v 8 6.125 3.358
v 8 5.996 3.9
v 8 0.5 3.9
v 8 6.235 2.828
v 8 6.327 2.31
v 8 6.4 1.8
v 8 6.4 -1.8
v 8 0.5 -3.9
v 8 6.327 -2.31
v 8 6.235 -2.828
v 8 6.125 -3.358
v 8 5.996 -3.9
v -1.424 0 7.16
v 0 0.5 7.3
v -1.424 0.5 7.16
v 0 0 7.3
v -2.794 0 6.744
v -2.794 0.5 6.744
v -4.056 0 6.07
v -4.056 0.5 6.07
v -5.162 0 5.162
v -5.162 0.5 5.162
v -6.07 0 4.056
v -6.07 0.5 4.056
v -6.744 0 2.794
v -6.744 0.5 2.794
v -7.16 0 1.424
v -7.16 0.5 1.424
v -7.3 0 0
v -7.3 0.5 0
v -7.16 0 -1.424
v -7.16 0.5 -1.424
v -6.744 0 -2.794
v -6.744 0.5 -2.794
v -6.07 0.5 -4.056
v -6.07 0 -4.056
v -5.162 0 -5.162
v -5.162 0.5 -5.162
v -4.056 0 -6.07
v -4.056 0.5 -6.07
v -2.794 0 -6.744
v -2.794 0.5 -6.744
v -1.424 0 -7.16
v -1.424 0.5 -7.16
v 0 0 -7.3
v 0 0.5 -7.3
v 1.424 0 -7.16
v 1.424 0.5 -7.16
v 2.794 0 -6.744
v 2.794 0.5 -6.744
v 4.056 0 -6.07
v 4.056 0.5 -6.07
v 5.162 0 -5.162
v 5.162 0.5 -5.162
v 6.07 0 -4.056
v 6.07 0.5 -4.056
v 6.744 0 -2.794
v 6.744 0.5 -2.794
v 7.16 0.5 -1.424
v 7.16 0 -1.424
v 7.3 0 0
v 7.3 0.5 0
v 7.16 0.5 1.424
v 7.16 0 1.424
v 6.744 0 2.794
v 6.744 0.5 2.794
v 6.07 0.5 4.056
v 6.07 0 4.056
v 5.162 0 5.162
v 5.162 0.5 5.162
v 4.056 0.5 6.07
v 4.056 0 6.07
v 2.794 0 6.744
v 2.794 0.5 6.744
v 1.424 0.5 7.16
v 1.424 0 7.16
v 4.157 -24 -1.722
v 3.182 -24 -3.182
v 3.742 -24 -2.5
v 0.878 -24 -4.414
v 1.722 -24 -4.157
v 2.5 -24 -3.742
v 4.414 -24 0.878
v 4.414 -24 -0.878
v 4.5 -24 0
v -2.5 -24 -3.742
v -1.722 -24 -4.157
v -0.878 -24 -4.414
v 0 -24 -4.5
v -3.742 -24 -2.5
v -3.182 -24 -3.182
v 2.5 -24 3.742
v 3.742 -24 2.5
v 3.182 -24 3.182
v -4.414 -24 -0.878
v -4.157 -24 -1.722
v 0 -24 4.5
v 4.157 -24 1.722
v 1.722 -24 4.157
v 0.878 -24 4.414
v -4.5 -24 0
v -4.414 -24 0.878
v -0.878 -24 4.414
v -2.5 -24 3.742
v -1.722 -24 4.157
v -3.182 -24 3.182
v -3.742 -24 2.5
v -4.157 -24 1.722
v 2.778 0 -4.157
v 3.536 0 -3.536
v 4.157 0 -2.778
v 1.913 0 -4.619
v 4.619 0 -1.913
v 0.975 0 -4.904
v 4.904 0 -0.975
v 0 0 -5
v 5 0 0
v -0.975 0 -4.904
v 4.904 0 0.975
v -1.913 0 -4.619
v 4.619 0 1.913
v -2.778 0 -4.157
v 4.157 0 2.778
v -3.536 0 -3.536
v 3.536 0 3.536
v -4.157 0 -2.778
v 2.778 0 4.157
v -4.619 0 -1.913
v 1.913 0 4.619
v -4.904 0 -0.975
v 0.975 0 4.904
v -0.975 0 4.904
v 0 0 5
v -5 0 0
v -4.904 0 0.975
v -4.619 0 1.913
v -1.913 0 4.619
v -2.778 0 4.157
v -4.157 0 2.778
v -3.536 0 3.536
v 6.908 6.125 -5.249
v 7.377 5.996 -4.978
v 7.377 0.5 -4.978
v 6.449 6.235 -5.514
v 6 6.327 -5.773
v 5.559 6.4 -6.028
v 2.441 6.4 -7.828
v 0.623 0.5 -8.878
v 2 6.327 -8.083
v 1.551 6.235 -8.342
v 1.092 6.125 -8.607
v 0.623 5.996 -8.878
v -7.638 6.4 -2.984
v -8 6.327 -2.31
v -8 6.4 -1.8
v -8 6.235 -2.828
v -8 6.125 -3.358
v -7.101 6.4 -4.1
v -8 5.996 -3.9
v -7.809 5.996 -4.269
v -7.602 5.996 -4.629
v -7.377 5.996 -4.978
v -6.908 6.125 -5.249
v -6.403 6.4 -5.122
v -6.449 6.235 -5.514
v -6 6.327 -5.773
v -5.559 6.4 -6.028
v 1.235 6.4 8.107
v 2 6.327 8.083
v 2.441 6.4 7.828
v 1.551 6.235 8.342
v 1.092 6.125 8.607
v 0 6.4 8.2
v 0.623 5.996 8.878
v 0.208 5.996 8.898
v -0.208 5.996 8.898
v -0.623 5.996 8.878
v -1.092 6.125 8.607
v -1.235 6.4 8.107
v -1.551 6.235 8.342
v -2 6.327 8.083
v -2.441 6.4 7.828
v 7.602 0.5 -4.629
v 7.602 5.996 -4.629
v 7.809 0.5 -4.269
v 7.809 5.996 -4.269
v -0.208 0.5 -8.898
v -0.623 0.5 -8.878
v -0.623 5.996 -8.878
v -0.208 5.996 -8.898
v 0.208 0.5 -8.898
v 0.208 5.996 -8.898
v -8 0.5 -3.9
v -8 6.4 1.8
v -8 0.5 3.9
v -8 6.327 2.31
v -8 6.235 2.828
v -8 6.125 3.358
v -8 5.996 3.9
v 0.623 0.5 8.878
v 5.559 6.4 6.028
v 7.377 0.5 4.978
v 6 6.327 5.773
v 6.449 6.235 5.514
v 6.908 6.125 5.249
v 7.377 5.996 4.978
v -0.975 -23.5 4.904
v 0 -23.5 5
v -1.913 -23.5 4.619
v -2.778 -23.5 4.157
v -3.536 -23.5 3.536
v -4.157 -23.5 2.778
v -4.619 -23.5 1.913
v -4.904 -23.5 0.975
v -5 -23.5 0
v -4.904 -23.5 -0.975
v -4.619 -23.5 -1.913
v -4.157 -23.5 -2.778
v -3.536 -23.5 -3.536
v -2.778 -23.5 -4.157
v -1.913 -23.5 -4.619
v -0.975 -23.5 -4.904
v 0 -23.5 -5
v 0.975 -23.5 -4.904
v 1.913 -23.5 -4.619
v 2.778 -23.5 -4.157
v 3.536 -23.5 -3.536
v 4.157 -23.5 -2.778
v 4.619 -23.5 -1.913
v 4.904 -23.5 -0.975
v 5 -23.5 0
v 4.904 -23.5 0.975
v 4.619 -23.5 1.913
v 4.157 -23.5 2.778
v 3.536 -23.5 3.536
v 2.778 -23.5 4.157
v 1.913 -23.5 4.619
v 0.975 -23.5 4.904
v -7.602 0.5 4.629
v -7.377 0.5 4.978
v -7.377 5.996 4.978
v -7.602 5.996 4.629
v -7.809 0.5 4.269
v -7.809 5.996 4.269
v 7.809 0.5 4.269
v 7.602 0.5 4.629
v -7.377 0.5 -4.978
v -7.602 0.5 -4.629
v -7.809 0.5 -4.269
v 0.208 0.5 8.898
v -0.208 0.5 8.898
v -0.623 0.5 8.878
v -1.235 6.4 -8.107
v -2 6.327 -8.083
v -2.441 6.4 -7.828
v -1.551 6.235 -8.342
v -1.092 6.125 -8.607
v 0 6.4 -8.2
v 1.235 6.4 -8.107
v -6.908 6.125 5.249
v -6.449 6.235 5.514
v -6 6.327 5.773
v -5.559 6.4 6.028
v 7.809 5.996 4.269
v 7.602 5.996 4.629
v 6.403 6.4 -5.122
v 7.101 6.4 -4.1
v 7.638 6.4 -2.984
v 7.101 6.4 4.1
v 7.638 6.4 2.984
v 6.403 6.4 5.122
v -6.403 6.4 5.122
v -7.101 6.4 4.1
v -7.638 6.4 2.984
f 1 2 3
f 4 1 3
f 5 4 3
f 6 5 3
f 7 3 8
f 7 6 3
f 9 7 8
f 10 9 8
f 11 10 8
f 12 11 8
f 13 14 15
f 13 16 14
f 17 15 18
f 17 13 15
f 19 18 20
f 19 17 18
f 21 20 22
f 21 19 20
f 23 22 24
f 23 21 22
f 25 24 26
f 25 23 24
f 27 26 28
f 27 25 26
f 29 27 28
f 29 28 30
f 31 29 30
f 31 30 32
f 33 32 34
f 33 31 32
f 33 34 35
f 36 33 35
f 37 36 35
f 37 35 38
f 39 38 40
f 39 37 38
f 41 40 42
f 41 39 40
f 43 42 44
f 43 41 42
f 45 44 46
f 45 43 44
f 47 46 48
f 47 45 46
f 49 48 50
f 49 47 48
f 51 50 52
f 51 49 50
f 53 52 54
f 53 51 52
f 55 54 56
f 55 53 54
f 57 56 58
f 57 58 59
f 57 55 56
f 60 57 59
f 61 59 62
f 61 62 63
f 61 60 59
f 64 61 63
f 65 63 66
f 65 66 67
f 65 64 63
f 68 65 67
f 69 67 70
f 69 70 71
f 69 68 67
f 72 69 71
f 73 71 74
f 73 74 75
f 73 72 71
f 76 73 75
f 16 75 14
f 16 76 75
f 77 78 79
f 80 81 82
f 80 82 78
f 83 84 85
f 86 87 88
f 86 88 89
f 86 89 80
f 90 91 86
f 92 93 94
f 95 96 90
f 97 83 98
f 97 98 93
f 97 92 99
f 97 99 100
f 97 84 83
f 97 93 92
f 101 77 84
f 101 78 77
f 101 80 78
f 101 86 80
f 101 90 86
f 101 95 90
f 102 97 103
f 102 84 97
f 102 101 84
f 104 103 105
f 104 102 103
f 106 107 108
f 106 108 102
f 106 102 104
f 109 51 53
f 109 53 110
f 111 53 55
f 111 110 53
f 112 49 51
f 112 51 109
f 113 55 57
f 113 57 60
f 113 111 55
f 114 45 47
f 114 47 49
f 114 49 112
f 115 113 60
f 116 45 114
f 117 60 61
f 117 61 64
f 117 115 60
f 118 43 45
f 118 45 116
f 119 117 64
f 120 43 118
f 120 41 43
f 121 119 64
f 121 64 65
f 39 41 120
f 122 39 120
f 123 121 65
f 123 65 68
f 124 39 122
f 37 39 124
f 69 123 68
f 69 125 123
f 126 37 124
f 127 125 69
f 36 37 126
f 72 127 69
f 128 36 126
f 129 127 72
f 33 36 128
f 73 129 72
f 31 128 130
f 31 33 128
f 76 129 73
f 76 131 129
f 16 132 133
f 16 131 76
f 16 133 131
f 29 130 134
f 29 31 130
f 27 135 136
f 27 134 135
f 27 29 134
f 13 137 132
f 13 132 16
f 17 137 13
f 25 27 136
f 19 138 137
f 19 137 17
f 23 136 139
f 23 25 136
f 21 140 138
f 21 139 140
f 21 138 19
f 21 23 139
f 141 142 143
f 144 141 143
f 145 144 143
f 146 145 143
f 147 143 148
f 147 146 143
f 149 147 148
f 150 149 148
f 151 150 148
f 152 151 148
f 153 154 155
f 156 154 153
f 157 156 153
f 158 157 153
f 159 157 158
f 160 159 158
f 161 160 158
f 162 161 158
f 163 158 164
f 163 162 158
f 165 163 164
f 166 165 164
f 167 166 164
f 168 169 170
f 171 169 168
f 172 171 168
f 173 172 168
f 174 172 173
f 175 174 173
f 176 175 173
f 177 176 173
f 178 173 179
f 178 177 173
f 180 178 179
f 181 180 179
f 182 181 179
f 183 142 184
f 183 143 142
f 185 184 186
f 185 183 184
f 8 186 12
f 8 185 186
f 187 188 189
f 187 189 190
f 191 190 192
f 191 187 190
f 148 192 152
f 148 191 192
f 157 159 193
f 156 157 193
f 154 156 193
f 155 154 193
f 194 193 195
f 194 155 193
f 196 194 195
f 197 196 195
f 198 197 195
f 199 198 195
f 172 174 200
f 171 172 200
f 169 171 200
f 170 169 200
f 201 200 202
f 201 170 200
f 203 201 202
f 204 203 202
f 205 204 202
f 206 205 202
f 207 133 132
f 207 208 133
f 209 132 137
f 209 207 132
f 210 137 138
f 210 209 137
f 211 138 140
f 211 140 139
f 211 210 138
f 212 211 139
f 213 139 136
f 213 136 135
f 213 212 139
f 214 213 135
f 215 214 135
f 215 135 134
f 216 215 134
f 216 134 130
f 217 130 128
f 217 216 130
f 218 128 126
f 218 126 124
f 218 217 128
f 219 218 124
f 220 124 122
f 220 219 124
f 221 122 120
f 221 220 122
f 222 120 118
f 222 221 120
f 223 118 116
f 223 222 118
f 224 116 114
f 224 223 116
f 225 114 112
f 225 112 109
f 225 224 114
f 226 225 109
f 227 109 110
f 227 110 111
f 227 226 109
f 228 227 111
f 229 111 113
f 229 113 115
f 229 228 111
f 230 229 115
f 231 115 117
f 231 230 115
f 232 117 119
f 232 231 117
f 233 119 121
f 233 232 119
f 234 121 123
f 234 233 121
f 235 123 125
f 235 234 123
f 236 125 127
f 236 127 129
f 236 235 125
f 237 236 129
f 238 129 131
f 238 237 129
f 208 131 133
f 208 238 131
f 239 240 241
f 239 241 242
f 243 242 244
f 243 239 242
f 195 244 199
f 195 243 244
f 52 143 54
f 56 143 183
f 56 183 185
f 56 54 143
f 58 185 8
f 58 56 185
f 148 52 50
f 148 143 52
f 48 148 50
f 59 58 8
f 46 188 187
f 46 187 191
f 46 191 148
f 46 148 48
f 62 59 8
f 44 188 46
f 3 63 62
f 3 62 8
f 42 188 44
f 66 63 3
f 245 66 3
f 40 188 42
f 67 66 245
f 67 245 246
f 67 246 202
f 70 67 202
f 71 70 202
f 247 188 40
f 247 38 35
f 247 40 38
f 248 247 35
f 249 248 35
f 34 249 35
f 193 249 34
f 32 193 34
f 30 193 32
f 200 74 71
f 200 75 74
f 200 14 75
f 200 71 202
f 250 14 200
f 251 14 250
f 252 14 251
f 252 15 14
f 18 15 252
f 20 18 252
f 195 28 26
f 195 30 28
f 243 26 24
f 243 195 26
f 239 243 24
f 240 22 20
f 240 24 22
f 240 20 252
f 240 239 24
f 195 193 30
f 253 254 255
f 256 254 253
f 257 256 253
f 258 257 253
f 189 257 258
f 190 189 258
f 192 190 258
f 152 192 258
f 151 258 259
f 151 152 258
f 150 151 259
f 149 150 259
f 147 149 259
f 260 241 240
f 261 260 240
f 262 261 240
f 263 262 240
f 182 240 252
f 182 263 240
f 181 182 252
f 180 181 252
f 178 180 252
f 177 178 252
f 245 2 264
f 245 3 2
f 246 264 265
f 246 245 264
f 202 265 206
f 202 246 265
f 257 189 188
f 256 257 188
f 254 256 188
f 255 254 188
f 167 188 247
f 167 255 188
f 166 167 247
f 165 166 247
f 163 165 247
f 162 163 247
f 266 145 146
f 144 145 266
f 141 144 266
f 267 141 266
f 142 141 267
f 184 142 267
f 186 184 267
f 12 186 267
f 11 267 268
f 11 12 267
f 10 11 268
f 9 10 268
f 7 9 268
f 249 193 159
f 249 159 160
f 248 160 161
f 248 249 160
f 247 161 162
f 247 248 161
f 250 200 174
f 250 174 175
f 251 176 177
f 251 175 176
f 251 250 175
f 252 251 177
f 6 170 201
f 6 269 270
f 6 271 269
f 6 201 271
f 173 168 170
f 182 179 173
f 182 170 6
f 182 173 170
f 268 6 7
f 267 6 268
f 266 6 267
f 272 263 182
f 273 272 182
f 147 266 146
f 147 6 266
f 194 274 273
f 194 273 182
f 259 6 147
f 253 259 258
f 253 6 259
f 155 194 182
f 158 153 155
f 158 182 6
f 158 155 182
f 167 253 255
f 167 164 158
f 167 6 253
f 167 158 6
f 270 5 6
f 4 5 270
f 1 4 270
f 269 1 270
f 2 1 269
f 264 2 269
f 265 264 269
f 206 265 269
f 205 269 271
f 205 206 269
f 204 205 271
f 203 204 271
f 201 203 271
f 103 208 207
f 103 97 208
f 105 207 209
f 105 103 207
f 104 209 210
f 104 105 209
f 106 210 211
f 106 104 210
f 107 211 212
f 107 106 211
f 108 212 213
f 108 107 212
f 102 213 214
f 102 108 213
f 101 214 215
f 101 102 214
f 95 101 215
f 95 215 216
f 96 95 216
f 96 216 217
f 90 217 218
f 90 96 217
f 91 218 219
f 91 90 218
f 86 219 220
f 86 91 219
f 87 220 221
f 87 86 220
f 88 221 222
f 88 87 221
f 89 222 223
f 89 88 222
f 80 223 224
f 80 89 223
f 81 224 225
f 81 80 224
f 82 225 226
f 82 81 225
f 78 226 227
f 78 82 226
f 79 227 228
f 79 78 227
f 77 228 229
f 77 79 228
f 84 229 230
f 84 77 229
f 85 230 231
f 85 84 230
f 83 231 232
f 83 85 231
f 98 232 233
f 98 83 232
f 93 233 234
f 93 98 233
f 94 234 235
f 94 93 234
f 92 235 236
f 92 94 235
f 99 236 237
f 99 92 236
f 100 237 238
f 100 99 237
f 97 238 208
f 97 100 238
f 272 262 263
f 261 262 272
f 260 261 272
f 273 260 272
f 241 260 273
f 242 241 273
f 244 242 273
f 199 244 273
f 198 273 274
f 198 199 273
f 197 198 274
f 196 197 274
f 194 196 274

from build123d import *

# Parameters (mm, degrees)
SZKIC2_OUTSIDE_W           = 27.694
SZKIC2_OUTSIDE_H           = 27.694
WYTNIJ_WYCI_GNI_CIE1_DEPTH = 30.4


with BuildPart() as part:
    # Szkic1 → Obrót1 (revolve)
    with BuildSketch(Plane.XY, mode=Mode.PRIVATE) as obr_t1_sk:
        Polygon((0, 6.4), (8.2, 6.4), (8.9, 5.995854812), (8.9, 0.5), (7.3, 0.5), (7.3, 0), (5, 0), (5, -23.5), (4.5, -24), (0, -24), align=None)
    revolve(obr_t1_sk.sketch.rotate(Axis((0, 37.287865055, 0), (0, -1, 0)), 90), axis=Axis((0, 37.287865055, 0), (0, -1, 0)))

    # Szkic2 outside → Wytnij-wyciągnięcie1 (cut)
    with BuildSketch(Plane(origin=(0, 6.4, 0), x_dir=(1, 0, 0), z_dir=(0, 1, 0))):
        Rectangle(SZKIC2_OUTSIDE_W, SZKIC2_OUTSIDE_H)
        Polygon((0, 9.237604307), (-8, 4.618802154), (-8, -4.618802154), (0, -9.237604307), (8, -4.618802154), (8, 4.618802154), align=None, mode=Mode.SUBTRACT)
    extrude(amount=-WYTNIJ_WYCI_GNI_CIE1_DEPTH, mode=Mode.SUBTRACT)


solid = part.part
